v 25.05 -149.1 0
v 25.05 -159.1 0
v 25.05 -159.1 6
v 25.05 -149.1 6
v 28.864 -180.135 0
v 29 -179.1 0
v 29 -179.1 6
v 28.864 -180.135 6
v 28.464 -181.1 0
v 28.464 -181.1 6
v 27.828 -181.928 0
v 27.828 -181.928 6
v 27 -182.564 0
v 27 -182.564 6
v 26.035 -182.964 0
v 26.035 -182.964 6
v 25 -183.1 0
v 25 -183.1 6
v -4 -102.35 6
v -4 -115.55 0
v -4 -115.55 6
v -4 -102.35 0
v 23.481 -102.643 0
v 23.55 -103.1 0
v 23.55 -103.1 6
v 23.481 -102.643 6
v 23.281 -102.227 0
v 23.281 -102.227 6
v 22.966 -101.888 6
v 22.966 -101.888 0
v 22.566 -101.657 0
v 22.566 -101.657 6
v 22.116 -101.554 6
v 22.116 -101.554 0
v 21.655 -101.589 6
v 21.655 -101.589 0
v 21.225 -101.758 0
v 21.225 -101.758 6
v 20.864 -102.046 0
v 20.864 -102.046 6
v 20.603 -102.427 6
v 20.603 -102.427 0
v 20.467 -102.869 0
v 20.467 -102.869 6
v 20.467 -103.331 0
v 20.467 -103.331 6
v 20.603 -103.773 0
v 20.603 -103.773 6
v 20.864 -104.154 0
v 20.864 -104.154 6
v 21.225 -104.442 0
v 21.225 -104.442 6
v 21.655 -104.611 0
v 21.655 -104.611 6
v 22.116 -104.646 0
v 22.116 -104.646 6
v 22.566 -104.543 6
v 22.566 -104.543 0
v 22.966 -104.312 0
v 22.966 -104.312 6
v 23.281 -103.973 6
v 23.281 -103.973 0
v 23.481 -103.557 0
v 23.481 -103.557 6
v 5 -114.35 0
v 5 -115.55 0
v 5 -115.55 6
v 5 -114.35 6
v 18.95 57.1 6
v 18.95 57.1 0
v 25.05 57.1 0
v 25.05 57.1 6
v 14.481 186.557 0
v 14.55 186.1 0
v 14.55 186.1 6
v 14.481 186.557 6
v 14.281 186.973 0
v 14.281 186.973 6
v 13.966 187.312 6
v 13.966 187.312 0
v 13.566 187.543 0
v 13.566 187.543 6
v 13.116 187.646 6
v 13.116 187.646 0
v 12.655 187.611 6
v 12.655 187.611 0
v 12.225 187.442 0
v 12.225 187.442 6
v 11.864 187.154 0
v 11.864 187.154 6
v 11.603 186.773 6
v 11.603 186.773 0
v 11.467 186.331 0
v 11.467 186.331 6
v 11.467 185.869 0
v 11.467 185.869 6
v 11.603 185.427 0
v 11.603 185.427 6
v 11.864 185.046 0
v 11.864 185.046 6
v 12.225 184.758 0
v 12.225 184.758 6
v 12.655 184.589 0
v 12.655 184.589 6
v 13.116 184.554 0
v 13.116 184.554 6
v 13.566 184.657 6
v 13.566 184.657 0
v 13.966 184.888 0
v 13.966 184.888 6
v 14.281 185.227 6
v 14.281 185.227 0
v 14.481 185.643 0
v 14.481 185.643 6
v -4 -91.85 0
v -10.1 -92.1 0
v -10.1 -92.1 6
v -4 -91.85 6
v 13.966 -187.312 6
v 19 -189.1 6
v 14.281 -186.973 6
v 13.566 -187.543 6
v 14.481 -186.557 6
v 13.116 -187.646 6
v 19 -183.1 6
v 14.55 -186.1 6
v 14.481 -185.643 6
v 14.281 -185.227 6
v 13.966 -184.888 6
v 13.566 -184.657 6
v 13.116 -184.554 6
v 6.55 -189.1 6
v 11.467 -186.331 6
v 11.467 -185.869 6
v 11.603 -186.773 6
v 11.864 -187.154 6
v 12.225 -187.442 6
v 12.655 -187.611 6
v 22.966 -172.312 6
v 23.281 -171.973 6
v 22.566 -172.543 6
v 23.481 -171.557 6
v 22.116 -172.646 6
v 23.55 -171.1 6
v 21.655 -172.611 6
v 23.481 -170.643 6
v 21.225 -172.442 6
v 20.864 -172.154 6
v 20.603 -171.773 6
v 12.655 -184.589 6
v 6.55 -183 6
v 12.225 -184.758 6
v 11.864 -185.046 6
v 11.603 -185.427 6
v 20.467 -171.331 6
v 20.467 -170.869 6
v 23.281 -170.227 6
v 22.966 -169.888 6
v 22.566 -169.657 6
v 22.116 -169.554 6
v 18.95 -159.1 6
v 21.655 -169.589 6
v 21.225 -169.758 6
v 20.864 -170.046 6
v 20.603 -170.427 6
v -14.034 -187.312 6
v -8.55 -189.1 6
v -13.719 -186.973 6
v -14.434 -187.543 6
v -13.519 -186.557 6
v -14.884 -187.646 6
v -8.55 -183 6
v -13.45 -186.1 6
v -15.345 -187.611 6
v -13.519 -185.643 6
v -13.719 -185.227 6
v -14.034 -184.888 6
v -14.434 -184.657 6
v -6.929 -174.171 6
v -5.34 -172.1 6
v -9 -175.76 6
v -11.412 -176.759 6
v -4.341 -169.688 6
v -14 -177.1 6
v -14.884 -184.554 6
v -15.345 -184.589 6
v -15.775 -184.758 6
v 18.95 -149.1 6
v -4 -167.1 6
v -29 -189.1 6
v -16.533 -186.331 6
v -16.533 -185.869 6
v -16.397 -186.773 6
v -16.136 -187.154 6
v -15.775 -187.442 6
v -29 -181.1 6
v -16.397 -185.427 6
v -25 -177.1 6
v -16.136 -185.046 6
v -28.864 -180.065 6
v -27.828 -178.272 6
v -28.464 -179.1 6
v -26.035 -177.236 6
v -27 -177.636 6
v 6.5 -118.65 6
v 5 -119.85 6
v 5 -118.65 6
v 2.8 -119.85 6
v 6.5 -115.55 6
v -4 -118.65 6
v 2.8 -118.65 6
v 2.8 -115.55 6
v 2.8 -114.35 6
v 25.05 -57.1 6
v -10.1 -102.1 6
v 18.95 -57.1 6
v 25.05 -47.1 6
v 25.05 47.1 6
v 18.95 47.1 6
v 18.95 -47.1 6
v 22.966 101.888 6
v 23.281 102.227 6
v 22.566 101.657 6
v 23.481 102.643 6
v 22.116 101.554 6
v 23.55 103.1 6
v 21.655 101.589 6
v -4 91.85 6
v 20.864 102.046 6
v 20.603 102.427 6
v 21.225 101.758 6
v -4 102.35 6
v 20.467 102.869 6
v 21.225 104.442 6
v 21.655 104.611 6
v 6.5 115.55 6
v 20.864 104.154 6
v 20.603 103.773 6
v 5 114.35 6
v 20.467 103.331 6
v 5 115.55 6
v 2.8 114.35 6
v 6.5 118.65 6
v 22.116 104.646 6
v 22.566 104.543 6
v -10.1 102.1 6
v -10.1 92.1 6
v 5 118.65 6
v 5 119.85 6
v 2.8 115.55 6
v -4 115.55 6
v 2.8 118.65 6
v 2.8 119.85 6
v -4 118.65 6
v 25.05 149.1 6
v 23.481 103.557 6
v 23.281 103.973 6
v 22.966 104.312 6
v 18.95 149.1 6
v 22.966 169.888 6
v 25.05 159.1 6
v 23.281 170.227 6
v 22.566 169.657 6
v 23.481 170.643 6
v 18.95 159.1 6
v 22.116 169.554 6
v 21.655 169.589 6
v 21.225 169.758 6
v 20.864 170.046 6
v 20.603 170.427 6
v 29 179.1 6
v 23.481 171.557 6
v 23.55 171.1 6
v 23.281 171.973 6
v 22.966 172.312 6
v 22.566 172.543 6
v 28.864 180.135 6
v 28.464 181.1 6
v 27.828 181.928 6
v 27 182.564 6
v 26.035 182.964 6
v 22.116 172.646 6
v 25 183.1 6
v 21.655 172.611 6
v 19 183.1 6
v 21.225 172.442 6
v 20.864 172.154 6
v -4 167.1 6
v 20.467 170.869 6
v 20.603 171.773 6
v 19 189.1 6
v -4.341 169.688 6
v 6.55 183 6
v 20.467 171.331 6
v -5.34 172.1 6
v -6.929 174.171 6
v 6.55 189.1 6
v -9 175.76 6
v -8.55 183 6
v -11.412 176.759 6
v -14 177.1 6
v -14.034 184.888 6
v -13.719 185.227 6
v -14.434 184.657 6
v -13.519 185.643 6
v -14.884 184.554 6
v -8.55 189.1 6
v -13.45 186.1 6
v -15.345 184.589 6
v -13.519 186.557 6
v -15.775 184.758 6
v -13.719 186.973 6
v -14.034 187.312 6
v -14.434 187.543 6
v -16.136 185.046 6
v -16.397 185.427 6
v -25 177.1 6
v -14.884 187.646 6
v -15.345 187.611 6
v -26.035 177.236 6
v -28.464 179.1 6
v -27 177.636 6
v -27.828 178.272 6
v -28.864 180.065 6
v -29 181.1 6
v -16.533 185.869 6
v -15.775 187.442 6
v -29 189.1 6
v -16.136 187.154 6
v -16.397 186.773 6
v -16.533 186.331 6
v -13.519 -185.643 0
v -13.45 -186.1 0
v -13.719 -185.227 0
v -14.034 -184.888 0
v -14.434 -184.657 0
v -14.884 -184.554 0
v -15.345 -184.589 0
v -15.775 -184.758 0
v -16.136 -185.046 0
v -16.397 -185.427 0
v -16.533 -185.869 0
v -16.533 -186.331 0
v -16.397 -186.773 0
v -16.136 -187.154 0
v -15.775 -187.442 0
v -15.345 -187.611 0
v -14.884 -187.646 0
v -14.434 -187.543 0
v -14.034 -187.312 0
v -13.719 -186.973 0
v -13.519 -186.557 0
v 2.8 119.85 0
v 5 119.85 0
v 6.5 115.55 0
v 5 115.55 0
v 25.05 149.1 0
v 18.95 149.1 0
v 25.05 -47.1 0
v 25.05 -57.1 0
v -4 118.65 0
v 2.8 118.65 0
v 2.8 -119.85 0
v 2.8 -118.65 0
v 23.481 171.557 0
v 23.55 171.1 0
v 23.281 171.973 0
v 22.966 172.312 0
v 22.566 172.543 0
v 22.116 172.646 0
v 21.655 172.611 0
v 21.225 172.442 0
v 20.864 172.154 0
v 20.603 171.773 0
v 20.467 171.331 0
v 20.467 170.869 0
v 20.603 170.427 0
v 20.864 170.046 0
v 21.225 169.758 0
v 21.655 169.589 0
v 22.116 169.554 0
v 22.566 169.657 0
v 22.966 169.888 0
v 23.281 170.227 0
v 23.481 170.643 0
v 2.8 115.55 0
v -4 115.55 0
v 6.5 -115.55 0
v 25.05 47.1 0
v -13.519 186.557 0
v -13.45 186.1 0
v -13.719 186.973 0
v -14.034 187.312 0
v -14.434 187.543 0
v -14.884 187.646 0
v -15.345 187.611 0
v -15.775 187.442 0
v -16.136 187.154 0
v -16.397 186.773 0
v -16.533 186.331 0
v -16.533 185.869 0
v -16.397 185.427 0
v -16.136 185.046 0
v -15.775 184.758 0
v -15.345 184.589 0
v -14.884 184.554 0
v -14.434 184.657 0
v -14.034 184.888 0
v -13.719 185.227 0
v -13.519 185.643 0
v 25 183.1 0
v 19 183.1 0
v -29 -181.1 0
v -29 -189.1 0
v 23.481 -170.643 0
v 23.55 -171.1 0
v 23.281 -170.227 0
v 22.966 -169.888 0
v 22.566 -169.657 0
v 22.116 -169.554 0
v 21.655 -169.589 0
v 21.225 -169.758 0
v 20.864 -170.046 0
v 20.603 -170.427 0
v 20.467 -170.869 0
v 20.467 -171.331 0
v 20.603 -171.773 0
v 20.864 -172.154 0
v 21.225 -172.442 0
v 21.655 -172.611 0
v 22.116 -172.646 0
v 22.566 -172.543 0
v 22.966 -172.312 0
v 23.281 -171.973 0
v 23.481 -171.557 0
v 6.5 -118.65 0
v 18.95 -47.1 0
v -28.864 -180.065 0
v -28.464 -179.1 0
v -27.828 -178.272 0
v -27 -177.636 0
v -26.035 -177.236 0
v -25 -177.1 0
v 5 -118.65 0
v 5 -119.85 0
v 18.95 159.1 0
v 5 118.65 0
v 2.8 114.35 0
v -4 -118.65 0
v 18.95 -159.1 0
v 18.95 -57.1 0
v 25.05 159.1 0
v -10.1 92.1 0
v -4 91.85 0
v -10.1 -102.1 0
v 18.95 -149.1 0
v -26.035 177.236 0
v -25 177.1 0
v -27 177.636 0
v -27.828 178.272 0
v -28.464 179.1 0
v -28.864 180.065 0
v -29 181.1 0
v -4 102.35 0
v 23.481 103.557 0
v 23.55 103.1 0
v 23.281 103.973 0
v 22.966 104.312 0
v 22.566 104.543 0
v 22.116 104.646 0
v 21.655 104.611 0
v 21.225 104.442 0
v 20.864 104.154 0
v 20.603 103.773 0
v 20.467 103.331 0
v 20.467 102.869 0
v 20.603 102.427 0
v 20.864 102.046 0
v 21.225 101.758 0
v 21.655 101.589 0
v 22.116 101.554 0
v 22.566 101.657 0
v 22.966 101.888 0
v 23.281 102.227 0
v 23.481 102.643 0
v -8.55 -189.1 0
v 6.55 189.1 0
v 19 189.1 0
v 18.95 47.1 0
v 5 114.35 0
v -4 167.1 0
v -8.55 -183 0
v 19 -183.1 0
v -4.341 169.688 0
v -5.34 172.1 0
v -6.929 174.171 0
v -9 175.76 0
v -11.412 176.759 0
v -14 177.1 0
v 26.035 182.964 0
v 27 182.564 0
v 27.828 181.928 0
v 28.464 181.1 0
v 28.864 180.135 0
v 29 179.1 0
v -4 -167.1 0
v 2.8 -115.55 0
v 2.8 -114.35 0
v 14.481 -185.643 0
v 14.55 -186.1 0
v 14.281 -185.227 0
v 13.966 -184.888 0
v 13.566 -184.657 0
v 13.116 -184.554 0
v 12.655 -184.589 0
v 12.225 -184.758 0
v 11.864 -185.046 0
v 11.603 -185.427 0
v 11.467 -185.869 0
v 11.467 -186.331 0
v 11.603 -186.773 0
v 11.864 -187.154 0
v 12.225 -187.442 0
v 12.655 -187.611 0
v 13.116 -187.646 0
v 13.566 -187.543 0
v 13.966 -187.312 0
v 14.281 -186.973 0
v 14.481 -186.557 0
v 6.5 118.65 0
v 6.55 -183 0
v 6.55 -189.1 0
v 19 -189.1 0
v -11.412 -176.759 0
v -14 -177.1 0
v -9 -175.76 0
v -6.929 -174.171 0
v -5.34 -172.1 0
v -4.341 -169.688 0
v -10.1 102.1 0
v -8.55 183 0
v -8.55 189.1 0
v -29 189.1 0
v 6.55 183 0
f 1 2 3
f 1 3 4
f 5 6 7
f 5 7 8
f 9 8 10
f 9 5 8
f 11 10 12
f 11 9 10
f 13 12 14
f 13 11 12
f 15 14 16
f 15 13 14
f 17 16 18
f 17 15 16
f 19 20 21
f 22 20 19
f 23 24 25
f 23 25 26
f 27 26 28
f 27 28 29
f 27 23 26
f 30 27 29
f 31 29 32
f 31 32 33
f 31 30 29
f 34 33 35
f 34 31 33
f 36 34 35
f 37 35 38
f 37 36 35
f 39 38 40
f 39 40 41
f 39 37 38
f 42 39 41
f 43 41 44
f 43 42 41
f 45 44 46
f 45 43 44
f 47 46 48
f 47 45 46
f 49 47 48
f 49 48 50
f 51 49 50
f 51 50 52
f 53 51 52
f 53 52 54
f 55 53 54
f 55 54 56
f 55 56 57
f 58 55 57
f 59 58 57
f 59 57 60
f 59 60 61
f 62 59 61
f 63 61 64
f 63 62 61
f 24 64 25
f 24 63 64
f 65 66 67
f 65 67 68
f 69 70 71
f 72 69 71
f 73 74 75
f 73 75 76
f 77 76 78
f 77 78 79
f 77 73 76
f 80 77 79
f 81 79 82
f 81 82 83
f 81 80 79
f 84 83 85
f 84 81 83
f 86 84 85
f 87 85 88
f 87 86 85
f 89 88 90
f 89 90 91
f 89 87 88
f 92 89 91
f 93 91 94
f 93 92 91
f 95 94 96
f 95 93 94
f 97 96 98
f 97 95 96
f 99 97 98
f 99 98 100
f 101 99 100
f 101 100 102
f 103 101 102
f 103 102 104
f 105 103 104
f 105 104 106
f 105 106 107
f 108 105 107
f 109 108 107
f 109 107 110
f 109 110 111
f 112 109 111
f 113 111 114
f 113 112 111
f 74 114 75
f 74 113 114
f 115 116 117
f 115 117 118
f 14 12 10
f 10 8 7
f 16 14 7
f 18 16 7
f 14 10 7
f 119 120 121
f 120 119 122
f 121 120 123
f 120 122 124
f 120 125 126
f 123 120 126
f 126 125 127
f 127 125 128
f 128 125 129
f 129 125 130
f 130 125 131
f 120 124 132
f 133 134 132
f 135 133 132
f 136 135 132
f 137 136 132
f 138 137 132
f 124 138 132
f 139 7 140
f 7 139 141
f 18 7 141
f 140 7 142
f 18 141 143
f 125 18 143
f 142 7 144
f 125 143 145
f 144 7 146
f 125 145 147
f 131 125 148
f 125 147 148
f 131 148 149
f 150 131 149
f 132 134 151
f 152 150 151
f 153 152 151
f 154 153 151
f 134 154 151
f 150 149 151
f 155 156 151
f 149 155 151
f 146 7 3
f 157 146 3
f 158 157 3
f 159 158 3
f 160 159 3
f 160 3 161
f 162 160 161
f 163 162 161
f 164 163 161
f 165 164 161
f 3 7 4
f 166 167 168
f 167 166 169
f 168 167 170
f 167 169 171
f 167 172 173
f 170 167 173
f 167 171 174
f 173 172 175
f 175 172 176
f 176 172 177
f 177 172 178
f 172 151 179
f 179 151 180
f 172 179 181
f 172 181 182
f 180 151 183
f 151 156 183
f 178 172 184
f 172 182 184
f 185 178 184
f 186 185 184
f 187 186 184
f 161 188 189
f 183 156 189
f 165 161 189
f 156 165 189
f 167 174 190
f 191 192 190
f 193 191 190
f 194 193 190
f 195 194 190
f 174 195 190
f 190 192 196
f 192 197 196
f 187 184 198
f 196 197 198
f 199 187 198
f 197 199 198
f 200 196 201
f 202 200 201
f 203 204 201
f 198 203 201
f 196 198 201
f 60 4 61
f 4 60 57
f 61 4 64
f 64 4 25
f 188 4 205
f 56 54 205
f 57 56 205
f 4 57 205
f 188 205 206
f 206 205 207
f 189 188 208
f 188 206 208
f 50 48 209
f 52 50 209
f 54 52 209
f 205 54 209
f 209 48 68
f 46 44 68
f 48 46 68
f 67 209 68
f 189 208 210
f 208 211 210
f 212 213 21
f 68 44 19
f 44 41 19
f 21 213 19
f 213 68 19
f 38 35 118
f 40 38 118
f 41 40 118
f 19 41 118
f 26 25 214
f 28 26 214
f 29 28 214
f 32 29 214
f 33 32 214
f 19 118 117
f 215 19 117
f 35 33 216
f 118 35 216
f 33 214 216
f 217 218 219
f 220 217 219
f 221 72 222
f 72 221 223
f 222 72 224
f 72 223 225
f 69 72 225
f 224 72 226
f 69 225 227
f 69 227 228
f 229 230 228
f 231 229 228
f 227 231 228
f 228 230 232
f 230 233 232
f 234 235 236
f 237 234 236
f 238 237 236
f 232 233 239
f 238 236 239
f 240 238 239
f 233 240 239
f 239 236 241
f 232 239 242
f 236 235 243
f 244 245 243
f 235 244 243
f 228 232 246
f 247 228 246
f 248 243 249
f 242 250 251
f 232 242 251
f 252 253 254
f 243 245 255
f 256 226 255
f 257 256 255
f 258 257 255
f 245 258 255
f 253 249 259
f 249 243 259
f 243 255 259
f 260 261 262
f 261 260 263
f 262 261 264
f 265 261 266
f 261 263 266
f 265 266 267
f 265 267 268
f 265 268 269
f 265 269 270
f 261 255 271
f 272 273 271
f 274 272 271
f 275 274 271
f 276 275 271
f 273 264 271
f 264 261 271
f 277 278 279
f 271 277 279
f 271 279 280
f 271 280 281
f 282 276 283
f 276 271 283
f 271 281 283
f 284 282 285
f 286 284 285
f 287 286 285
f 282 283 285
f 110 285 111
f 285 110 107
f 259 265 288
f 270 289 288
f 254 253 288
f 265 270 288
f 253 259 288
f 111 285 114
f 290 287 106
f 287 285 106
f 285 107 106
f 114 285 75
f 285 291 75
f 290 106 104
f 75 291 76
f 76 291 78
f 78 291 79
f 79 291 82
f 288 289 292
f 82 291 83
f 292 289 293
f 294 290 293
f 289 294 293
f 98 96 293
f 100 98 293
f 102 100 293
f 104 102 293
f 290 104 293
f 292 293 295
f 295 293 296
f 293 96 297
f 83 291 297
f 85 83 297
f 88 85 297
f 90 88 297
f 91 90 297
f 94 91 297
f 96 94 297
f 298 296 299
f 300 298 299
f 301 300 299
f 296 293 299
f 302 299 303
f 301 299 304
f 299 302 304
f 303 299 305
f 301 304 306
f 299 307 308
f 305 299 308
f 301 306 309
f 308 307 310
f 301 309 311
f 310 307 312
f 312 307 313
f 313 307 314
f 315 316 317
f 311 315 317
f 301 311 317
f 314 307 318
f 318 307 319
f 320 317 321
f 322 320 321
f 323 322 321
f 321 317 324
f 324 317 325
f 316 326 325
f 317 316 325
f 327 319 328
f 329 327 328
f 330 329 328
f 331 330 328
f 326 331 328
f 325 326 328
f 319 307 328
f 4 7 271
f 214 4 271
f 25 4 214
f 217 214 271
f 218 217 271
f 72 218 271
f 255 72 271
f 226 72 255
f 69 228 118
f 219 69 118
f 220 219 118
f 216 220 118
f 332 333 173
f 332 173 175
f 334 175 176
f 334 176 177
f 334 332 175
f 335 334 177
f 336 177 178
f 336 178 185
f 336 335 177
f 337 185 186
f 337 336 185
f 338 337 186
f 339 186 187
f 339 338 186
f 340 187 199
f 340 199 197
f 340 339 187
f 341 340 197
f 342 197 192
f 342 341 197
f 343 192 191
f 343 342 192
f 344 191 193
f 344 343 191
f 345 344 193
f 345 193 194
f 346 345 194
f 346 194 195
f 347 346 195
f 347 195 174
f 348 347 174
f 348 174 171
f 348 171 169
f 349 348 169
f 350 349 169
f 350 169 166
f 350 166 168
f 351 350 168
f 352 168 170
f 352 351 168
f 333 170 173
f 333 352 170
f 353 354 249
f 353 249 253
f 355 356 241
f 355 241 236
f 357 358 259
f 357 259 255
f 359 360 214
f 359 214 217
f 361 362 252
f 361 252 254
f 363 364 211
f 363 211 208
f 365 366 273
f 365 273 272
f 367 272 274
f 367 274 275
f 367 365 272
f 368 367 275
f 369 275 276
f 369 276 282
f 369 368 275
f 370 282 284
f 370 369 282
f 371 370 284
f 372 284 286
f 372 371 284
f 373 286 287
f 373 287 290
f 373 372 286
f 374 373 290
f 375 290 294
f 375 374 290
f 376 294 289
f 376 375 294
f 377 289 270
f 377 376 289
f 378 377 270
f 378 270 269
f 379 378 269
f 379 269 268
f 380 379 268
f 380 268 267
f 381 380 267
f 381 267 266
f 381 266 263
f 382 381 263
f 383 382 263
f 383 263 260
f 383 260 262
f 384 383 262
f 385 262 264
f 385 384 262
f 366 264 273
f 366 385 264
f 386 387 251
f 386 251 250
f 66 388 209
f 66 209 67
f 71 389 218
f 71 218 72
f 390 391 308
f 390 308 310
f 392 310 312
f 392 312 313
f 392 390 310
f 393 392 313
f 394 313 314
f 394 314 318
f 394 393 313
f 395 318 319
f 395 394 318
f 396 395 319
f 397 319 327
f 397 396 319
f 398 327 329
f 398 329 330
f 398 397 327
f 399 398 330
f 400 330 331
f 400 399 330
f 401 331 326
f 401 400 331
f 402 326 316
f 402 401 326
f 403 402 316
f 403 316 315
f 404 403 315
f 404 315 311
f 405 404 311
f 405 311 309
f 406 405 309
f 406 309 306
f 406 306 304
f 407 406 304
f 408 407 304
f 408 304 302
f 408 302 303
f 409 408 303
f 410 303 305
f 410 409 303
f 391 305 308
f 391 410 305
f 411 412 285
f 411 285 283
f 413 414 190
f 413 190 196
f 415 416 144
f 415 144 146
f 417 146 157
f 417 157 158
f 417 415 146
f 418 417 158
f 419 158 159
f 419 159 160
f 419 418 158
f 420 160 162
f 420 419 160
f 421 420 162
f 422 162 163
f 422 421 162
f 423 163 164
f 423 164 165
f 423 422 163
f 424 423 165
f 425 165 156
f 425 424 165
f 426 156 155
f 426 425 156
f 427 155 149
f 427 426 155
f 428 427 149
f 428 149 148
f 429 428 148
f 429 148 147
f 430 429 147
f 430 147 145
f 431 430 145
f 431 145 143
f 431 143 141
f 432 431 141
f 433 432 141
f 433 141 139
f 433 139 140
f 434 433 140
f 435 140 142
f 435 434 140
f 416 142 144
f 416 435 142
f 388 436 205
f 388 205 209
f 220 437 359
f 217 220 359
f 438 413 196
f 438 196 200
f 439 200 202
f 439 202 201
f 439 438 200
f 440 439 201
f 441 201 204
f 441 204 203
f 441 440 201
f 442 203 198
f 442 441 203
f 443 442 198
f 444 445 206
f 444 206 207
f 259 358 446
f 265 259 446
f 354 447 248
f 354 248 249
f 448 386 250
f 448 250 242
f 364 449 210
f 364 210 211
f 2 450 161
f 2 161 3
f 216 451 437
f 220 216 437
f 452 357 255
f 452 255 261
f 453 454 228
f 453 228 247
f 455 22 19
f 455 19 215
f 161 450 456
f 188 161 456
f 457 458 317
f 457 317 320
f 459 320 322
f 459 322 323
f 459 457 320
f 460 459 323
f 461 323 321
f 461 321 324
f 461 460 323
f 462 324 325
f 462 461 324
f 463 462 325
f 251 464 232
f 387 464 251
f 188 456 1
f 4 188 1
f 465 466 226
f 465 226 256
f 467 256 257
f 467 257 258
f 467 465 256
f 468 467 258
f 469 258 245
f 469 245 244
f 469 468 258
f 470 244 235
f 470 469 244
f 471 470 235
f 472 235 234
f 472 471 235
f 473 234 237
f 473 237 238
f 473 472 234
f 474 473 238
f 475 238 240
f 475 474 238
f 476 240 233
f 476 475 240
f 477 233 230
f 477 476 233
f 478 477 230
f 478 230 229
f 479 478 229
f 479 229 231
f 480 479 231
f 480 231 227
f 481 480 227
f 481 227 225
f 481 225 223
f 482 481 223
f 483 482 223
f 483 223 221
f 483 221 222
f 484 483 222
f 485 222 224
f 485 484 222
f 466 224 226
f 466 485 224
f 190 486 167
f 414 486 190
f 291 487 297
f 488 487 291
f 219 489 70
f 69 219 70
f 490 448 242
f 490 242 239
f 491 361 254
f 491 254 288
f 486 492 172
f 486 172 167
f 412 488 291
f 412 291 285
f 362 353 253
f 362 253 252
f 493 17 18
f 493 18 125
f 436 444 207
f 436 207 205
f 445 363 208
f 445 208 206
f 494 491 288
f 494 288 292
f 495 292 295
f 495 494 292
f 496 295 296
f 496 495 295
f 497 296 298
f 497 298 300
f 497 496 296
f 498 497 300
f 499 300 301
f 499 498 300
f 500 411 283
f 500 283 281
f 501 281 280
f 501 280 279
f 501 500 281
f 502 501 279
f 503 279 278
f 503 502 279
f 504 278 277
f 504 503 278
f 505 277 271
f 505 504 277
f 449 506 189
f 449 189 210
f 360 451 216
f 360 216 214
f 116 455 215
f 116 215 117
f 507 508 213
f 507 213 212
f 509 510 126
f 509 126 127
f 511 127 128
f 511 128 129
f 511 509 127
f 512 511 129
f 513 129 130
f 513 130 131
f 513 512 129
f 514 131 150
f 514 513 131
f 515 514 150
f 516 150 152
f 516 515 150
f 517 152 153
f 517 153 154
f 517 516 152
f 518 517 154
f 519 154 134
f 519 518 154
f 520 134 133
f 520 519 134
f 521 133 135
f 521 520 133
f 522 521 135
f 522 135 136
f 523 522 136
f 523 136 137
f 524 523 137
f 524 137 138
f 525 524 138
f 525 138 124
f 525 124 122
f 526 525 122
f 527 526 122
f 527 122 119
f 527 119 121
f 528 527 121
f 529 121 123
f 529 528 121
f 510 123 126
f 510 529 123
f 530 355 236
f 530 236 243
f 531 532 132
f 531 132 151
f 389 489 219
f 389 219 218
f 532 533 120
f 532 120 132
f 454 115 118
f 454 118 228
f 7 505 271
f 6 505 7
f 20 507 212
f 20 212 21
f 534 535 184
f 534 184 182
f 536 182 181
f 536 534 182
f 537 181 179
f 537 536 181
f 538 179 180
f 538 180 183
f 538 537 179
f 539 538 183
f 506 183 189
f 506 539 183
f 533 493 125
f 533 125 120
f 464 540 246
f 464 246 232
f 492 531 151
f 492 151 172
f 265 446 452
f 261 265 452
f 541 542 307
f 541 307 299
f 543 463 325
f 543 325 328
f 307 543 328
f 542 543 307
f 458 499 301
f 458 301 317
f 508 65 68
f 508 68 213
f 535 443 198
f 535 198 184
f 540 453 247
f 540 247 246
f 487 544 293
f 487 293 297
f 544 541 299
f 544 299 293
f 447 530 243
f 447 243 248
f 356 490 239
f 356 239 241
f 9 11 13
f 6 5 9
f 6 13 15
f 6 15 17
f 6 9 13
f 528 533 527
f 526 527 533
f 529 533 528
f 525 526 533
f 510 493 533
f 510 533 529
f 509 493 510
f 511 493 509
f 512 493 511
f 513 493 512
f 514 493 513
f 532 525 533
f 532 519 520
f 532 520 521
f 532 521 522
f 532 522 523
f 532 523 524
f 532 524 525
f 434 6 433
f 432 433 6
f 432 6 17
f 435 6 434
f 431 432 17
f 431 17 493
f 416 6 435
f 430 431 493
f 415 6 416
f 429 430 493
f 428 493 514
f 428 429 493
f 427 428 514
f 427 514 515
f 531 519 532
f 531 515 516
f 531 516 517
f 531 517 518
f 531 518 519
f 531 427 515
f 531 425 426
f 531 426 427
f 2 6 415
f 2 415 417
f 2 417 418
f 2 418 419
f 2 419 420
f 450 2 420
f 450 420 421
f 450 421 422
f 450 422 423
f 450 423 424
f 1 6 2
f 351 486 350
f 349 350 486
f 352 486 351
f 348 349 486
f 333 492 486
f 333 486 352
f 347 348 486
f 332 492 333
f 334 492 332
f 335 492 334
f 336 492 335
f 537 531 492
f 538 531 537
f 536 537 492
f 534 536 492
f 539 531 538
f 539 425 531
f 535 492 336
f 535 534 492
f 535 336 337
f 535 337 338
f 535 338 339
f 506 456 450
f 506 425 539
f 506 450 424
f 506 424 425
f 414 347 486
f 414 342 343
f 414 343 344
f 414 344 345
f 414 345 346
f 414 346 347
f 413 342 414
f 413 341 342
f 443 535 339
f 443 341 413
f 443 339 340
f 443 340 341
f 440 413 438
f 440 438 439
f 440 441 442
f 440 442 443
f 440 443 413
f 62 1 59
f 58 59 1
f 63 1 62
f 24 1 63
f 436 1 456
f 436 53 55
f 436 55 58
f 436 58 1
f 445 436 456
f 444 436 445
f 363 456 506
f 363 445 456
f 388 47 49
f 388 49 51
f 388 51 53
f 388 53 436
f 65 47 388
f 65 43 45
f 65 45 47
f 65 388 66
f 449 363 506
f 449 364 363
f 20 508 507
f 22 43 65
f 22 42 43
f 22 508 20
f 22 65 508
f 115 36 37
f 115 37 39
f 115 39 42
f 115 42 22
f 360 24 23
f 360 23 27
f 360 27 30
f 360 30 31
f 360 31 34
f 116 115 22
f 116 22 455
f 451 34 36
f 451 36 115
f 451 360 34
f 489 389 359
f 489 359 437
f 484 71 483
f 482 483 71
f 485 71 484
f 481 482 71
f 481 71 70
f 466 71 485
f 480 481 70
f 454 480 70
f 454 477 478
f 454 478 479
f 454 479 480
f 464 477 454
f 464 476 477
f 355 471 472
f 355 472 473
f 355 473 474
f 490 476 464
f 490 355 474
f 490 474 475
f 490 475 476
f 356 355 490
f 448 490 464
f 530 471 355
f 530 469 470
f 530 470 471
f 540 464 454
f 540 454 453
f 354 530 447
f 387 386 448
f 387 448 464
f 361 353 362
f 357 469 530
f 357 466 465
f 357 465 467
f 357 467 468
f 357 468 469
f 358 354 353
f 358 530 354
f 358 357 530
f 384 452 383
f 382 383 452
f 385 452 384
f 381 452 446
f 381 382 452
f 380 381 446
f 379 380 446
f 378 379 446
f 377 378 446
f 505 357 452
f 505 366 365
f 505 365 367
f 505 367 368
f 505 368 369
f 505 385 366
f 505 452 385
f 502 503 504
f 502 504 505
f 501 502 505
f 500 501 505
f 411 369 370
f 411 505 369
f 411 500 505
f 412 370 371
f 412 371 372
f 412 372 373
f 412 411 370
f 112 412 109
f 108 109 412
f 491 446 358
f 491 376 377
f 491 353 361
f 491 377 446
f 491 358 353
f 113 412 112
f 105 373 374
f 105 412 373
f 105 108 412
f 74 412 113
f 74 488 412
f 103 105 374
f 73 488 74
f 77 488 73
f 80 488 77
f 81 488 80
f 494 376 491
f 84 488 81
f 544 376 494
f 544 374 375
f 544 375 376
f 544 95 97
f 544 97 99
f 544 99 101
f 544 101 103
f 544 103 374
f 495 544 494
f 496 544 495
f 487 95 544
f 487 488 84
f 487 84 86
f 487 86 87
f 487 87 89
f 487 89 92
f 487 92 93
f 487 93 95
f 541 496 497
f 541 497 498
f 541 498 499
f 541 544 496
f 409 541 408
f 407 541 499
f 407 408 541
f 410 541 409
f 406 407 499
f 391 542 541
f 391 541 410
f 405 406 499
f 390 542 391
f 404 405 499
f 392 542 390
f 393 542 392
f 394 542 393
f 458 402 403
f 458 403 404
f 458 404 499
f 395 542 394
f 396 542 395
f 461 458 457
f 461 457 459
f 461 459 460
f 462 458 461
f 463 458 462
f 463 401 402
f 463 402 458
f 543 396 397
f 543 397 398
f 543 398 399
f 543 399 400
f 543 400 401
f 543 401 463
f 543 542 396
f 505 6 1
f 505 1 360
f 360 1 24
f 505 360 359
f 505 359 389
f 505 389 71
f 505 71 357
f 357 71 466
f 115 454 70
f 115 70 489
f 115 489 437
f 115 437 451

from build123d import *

# Parameters (mm, degrees)
SKETCH_1_R      = 1.55
SKETCH_1_W      = 6.1
SKETCH_1_H      = 10
EXTRUDE_1_DEPTH = 6


with BuildPart() as part:
    # Эскиз1 → Бобышка-Вытянуть1 (new body)
    with BuildSketch(Plane.XY):
        with BuildLine():
            Line((2.8, 115.55), (2.8, 114.35))
            Line((2.8, 114.35), (5, 114.35))
            Line((5, 114.35), (5, 115.55))
            Line((5, 115.55), (6.5, 115.55))
            Line((6.5, 115.55), (6.5, 118.65))
            Line((6.5, 118.65), (5, 118.65))
            Line((5, 118.65), (5, 119.85))
            Line((5, 119.85), (2.8, 119.85))
            Line((2.8, 119.85), (2.8, 118.65))
            Line((2.8, 118.65), (-4, 118.65))
            Line((-4, 118.65), (-4, 167.1))
            ThreePointArc((-4, 167.1), (-6.928932188, 174.171067812), (-14, 177.1))
            Line((-14, 177.1), (-25, 177.1))
            ThreePointArc((-25, 177.1), (-27.828427125, 178.271572875), (-29, 181.1))
            Line((-29, 181.1), (-29, 189.1))
            Line((-29, 189.1), (-8.55, 189.1))
            Line((-8.55, 189.1), (-8.55, 183))
            Line((-8.55, 183), (6.55, 183))
            Line((6.55, 183), (6.55, 189.1))
            Line((6.55, 189.1), (19, 189.1))
            Line((19, 189.1), (19, 183.1))
            Line((19, 183.1), (25, 183.1))
            ThreePointArc((25, 183.1), (27.828427125, 181.928427125), (29, 179.1))
            Line((29, 179.1), (29, -179.1))
            ThreePointArc((29, -179.1), (27.828427125, -181.928427125), (25, -183.1))
            Line((25, -183.1), (19, -183.1))
            Line((19, -183.1), (19, -189.1))
            Line((19, -189.1), (6.55, -189.1))
            Line((6.55, -189.1), (6.55, -183))
            Line((6.55, -183), (-8.55, -183))
            Line((-8.55, -183), (-8.55, -189.1))
            Line((-8.55, -189.1), (-29, -189.1))
            Line((-29, -189.1), (-29, -181.1))
            ThreePointArc((-29, -181.1), (-27.828427125, -178.271572875), (-25, -177.1))
            Line((-25, -177.1), (-14, -177.1))
            ThreePointArc((-14, -177.1), (-6.928932188, -174.171067812), (-4, -167.1))
            Line((-4, -167.1), (-4, -118.65))
            Line((-4, -118.65), (2.8, -118.65))
            Line((2.8, -118.65), (2.8, -119.85))
            Line((2.8, -119.85), (5, -119.85))
            Line((5, -119.85), (5, -118.65))
            Line((5, -118.65), (6.5, -118.65))
            Line((6.5, -118.65), (6.5, -115.55))
            Line((6.5, -115.55), (5, -115.55))
            Line((5, -115.55), (5, -114.35))
            Line((5, -114.35), (2.8, -114.35))
            Line((2.8, -114.35), (2.8, -115.55))
            Line((2.8, -115.55), (-4, -115.55))
            Line((-4, -115.55), (-4, -102.35))
            Line((-4, -102.35), (-10.1, -102.1))
            Line((-10.1, -102.1), (-10.1, -92.1))
            Line((-10.1, -92.1), (-4, -91.85))
            Line((-4, -91.85), (-4, 91.85))
            Line((-4, 91.85), (-10.1, 92.1))
            Line((-10.1, 92.1), (-10.1, 102.1))
            Line((-10.1, 102.1), (-4, 102.35))
            Line((-4, 102.35), (-4, 115.55))
            Line((-4, 115.55), (2.8, 115.55))
        make_face()
        with Locations((-15, 186.1)):
            Circle(SKETCH_1_R, mode=Mode.SUBTRACT)
        with Locations((13, 186.1)):
            Circle(SKETCH_1_R, mode=Mode.SUBTRACT)
        with Locations((22, 103.1)):
            Circle(SKETCH_1_R, mode=Mode.SUBTRACT)
        with Locations((22, 171.1)):
            Circle(SKETCH_1_R, mode=Mode.SUBTRACT)
        with Locations((-15, -186.1)):
            Circle(SKETCH_1_R, mode=Mode.SUBTRACT)
        with Locations((13, -186.1)):
            Circle(SKETCH_1_R, mode=Mode.SUBTRACT)
        with Locations((22, -103.1)):
            Circle(SKETCH_1_R, mode=Mode.SUBTRACT)
        with Locations((22, -171.1)):
            Circle(SKETCH_1_R, mode=Mode.SUBTRACT)
        with Locations((22, 154.1)):
            Rectangle(SKETCH_1_W, SKETCH_1_H, mode=Mode.SUBTRACT)
        with Locations((22, 52.1)):
            Rectangle(SKETCH_1_W, SKETCH_1_H, mode=Mode.SUBTRACT)
        with Locations((22, -154.1)):
            Rectangle(SKETCH_1_W, SKETCH_1_H, mode=Mode.SUBTRACT)
        with Locations((22, -52.1)):
            Rectangle(SKETCH_1_W, SKETCH_1_H, mode=Mode.SUBTRACT)
    extrude(amount=EXTRUDE_1_DEPTH)


solid = part.part
